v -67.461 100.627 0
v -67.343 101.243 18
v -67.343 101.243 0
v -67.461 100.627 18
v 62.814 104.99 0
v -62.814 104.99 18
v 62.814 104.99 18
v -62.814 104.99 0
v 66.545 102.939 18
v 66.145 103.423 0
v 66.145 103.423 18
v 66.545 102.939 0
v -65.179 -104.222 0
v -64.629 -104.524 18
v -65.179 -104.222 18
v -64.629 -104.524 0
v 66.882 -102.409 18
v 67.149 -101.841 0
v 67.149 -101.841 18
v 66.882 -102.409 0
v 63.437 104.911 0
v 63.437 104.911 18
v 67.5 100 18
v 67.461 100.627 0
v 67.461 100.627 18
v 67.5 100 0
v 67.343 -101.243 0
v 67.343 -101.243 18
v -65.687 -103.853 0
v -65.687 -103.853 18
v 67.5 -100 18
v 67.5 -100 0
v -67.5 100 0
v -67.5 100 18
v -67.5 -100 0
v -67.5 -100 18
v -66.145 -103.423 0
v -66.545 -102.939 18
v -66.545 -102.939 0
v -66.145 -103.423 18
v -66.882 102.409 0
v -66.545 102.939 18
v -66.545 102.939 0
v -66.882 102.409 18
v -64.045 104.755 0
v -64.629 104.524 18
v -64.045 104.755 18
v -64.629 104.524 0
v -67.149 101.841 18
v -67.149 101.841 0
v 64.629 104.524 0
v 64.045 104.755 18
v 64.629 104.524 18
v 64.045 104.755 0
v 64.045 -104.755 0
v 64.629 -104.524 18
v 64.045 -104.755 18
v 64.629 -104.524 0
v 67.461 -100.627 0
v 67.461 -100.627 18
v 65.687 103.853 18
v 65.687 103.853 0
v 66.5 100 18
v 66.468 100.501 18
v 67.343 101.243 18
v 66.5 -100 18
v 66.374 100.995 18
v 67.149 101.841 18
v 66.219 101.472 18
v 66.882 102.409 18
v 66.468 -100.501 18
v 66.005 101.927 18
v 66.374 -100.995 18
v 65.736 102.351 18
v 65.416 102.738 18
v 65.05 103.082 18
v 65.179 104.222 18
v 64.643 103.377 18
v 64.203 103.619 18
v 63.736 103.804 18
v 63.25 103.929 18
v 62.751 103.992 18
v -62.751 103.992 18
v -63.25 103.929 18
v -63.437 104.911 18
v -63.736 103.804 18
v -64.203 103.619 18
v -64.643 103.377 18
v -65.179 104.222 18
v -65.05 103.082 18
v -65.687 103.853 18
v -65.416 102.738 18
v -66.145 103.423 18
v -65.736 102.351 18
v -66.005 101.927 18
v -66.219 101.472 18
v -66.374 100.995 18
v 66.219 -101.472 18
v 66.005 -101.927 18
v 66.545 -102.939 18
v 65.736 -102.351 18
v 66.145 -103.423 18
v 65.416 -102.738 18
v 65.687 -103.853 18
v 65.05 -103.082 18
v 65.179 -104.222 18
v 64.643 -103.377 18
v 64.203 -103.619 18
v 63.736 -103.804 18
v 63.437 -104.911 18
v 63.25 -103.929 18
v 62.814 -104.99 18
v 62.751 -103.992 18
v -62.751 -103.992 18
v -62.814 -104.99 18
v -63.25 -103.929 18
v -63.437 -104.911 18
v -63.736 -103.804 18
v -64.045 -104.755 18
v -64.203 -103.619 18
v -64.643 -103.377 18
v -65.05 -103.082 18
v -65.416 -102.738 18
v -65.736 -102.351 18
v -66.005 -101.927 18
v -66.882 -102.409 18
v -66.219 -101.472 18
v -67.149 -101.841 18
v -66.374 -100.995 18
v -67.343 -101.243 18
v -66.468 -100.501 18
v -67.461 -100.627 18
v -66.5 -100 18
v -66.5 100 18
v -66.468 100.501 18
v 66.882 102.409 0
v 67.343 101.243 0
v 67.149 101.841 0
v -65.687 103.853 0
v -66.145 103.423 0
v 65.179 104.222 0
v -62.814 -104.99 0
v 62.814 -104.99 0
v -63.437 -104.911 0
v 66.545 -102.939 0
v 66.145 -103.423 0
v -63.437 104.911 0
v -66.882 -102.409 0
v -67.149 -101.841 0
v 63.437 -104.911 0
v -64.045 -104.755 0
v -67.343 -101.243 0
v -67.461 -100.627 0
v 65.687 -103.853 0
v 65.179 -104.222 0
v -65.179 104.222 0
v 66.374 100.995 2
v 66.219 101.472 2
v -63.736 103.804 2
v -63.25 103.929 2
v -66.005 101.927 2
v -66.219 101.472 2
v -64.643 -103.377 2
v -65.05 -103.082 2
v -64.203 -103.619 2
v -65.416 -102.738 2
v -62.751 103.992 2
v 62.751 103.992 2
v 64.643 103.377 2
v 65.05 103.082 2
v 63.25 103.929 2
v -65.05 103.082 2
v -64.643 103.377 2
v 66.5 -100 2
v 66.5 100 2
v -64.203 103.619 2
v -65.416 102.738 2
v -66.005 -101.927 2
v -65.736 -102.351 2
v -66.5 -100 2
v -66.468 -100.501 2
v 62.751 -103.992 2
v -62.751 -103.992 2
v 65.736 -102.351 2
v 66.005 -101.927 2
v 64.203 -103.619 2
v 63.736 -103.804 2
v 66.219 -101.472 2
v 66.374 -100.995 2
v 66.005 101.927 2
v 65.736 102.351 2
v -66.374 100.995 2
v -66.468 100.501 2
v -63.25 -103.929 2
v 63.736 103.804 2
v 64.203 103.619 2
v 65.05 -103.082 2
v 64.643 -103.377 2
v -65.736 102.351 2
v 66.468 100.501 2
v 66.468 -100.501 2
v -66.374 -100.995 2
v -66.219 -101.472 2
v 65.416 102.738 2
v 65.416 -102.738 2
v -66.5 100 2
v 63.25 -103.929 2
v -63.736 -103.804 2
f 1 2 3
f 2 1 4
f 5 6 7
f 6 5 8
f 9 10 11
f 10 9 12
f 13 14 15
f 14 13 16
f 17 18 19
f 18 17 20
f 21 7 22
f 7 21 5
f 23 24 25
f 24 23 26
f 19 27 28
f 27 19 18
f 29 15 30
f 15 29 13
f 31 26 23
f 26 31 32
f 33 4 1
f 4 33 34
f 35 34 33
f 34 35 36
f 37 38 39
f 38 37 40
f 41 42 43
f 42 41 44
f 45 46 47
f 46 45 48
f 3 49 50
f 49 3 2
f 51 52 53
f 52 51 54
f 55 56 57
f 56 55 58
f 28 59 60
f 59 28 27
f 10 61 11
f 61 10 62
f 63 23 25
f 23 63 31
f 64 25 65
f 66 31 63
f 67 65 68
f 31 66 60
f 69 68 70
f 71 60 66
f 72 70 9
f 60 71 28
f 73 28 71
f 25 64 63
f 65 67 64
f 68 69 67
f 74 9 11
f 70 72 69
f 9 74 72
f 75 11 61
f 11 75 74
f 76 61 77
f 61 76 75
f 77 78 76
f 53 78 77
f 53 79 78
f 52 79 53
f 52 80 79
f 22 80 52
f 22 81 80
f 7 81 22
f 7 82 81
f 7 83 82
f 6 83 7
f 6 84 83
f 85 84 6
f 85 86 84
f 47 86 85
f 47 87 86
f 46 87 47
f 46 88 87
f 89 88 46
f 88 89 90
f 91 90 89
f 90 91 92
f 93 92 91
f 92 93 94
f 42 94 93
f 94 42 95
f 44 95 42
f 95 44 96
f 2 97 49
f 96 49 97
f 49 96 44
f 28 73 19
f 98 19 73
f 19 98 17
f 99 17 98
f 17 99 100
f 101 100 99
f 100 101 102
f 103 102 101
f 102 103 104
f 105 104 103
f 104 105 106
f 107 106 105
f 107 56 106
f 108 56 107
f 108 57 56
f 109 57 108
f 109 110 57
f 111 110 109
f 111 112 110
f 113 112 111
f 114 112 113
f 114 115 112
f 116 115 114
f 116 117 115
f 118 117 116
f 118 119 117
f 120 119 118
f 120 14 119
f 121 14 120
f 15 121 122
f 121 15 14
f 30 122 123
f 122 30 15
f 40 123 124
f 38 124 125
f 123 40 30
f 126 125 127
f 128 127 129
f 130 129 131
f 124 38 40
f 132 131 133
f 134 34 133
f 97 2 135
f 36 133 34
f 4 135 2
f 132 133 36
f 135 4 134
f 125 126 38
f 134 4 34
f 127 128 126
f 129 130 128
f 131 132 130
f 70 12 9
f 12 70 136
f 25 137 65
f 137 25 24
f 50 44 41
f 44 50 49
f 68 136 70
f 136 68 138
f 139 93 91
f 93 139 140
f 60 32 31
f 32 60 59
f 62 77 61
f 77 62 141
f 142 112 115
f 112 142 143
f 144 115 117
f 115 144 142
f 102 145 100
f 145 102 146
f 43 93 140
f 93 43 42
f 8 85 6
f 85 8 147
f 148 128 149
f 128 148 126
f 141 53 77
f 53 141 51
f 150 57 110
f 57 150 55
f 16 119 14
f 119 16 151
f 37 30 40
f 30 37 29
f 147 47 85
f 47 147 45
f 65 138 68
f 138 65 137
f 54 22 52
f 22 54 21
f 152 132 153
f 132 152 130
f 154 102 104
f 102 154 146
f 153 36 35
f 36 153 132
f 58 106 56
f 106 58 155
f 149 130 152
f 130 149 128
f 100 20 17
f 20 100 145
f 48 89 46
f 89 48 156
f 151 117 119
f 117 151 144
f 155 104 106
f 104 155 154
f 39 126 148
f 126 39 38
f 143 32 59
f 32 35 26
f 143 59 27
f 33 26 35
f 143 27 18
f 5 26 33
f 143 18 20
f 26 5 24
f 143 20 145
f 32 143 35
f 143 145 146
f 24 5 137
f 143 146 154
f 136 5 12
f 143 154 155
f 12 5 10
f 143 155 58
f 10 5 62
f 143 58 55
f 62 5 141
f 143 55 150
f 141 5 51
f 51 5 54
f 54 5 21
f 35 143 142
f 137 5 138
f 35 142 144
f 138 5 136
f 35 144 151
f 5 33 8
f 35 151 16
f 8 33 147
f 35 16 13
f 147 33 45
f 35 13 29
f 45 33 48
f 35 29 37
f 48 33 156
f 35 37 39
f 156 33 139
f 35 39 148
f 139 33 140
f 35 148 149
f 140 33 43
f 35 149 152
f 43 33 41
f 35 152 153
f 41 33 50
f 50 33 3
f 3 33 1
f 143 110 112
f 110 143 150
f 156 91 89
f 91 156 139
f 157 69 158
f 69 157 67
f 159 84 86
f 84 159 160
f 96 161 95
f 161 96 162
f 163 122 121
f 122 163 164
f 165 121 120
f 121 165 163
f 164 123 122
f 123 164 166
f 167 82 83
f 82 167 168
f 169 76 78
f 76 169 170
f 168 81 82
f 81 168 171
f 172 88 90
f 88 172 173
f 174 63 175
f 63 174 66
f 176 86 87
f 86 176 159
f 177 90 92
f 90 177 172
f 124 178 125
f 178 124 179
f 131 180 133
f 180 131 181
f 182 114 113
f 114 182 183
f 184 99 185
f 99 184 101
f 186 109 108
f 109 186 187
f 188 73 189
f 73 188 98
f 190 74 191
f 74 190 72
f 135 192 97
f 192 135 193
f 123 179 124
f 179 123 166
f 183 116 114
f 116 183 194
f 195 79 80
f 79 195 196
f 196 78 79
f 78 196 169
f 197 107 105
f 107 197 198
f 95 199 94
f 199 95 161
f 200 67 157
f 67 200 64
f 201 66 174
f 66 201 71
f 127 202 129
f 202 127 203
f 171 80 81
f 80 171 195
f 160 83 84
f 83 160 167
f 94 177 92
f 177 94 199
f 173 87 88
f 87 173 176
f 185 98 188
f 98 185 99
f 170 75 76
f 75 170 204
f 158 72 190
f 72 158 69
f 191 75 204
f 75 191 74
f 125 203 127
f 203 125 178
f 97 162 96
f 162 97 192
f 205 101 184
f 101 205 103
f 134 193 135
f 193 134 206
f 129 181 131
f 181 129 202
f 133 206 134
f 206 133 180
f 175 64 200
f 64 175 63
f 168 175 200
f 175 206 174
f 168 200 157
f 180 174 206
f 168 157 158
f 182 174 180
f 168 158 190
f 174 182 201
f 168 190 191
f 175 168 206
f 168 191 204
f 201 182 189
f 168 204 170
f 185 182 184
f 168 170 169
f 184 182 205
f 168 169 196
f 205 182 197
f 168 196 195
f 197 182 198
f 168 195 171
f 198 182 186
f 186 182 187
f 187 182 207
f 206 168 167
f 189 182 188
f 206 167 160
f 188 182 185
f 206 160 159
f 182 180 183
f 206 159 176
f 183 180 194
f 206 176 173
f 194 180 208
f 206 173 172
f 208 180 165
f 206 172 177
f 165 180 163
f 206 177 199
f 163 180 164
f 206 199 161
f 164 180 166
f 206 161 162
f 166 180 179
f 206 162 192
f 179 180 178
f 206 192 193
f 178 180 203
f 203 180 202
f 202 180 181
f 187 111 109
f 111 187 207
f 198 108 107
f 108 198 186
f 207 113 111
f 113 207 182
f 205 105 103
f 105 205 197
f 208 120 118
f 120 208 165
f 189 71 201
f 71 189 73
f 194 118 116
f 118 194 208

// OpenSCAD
$fn = 50;


difference() {
	union() {
		hull() {
			translate(v = [-62.5000000000, 100.0000000000, 0]) {
				cylinder(h = 18, r = 5);
			}
			translate(v = [62.5000000000, 100.0000000000, 0]) {
				cylinder(h = 18, r = 5);
			}
			translate(v = [-62.5000000000, -100.0000000000, 0]) {
				cylinder(h = 18, r = 5);
			}
			translate(v = [62.5000000000, -100.0000000000, 0]) {
				cylinder(h = 18, r = 5);
			}
		}
	}
	union() {
		translate(v = [0, 0, 2]) {
			hull() {
				translate(v = [-62.5000000000, 100.0000000000, 0]) {
					cylinder(h = 16, r = 4);
				}
				translate(v = [62.5000000000, 100.0000000000, 0]) {
					cylinder(h = 16, r = 4);
				}
				translate(v = [-62.5000000000, -100.0000000000, 0]) {
					cylinder(h = 16, r = 4);
				}
				translate(v = [62.5000000000, -100.0000000000, 0]) {
					cylinder(h = 16, r = 4);
				}
			}
		}
	}
}
